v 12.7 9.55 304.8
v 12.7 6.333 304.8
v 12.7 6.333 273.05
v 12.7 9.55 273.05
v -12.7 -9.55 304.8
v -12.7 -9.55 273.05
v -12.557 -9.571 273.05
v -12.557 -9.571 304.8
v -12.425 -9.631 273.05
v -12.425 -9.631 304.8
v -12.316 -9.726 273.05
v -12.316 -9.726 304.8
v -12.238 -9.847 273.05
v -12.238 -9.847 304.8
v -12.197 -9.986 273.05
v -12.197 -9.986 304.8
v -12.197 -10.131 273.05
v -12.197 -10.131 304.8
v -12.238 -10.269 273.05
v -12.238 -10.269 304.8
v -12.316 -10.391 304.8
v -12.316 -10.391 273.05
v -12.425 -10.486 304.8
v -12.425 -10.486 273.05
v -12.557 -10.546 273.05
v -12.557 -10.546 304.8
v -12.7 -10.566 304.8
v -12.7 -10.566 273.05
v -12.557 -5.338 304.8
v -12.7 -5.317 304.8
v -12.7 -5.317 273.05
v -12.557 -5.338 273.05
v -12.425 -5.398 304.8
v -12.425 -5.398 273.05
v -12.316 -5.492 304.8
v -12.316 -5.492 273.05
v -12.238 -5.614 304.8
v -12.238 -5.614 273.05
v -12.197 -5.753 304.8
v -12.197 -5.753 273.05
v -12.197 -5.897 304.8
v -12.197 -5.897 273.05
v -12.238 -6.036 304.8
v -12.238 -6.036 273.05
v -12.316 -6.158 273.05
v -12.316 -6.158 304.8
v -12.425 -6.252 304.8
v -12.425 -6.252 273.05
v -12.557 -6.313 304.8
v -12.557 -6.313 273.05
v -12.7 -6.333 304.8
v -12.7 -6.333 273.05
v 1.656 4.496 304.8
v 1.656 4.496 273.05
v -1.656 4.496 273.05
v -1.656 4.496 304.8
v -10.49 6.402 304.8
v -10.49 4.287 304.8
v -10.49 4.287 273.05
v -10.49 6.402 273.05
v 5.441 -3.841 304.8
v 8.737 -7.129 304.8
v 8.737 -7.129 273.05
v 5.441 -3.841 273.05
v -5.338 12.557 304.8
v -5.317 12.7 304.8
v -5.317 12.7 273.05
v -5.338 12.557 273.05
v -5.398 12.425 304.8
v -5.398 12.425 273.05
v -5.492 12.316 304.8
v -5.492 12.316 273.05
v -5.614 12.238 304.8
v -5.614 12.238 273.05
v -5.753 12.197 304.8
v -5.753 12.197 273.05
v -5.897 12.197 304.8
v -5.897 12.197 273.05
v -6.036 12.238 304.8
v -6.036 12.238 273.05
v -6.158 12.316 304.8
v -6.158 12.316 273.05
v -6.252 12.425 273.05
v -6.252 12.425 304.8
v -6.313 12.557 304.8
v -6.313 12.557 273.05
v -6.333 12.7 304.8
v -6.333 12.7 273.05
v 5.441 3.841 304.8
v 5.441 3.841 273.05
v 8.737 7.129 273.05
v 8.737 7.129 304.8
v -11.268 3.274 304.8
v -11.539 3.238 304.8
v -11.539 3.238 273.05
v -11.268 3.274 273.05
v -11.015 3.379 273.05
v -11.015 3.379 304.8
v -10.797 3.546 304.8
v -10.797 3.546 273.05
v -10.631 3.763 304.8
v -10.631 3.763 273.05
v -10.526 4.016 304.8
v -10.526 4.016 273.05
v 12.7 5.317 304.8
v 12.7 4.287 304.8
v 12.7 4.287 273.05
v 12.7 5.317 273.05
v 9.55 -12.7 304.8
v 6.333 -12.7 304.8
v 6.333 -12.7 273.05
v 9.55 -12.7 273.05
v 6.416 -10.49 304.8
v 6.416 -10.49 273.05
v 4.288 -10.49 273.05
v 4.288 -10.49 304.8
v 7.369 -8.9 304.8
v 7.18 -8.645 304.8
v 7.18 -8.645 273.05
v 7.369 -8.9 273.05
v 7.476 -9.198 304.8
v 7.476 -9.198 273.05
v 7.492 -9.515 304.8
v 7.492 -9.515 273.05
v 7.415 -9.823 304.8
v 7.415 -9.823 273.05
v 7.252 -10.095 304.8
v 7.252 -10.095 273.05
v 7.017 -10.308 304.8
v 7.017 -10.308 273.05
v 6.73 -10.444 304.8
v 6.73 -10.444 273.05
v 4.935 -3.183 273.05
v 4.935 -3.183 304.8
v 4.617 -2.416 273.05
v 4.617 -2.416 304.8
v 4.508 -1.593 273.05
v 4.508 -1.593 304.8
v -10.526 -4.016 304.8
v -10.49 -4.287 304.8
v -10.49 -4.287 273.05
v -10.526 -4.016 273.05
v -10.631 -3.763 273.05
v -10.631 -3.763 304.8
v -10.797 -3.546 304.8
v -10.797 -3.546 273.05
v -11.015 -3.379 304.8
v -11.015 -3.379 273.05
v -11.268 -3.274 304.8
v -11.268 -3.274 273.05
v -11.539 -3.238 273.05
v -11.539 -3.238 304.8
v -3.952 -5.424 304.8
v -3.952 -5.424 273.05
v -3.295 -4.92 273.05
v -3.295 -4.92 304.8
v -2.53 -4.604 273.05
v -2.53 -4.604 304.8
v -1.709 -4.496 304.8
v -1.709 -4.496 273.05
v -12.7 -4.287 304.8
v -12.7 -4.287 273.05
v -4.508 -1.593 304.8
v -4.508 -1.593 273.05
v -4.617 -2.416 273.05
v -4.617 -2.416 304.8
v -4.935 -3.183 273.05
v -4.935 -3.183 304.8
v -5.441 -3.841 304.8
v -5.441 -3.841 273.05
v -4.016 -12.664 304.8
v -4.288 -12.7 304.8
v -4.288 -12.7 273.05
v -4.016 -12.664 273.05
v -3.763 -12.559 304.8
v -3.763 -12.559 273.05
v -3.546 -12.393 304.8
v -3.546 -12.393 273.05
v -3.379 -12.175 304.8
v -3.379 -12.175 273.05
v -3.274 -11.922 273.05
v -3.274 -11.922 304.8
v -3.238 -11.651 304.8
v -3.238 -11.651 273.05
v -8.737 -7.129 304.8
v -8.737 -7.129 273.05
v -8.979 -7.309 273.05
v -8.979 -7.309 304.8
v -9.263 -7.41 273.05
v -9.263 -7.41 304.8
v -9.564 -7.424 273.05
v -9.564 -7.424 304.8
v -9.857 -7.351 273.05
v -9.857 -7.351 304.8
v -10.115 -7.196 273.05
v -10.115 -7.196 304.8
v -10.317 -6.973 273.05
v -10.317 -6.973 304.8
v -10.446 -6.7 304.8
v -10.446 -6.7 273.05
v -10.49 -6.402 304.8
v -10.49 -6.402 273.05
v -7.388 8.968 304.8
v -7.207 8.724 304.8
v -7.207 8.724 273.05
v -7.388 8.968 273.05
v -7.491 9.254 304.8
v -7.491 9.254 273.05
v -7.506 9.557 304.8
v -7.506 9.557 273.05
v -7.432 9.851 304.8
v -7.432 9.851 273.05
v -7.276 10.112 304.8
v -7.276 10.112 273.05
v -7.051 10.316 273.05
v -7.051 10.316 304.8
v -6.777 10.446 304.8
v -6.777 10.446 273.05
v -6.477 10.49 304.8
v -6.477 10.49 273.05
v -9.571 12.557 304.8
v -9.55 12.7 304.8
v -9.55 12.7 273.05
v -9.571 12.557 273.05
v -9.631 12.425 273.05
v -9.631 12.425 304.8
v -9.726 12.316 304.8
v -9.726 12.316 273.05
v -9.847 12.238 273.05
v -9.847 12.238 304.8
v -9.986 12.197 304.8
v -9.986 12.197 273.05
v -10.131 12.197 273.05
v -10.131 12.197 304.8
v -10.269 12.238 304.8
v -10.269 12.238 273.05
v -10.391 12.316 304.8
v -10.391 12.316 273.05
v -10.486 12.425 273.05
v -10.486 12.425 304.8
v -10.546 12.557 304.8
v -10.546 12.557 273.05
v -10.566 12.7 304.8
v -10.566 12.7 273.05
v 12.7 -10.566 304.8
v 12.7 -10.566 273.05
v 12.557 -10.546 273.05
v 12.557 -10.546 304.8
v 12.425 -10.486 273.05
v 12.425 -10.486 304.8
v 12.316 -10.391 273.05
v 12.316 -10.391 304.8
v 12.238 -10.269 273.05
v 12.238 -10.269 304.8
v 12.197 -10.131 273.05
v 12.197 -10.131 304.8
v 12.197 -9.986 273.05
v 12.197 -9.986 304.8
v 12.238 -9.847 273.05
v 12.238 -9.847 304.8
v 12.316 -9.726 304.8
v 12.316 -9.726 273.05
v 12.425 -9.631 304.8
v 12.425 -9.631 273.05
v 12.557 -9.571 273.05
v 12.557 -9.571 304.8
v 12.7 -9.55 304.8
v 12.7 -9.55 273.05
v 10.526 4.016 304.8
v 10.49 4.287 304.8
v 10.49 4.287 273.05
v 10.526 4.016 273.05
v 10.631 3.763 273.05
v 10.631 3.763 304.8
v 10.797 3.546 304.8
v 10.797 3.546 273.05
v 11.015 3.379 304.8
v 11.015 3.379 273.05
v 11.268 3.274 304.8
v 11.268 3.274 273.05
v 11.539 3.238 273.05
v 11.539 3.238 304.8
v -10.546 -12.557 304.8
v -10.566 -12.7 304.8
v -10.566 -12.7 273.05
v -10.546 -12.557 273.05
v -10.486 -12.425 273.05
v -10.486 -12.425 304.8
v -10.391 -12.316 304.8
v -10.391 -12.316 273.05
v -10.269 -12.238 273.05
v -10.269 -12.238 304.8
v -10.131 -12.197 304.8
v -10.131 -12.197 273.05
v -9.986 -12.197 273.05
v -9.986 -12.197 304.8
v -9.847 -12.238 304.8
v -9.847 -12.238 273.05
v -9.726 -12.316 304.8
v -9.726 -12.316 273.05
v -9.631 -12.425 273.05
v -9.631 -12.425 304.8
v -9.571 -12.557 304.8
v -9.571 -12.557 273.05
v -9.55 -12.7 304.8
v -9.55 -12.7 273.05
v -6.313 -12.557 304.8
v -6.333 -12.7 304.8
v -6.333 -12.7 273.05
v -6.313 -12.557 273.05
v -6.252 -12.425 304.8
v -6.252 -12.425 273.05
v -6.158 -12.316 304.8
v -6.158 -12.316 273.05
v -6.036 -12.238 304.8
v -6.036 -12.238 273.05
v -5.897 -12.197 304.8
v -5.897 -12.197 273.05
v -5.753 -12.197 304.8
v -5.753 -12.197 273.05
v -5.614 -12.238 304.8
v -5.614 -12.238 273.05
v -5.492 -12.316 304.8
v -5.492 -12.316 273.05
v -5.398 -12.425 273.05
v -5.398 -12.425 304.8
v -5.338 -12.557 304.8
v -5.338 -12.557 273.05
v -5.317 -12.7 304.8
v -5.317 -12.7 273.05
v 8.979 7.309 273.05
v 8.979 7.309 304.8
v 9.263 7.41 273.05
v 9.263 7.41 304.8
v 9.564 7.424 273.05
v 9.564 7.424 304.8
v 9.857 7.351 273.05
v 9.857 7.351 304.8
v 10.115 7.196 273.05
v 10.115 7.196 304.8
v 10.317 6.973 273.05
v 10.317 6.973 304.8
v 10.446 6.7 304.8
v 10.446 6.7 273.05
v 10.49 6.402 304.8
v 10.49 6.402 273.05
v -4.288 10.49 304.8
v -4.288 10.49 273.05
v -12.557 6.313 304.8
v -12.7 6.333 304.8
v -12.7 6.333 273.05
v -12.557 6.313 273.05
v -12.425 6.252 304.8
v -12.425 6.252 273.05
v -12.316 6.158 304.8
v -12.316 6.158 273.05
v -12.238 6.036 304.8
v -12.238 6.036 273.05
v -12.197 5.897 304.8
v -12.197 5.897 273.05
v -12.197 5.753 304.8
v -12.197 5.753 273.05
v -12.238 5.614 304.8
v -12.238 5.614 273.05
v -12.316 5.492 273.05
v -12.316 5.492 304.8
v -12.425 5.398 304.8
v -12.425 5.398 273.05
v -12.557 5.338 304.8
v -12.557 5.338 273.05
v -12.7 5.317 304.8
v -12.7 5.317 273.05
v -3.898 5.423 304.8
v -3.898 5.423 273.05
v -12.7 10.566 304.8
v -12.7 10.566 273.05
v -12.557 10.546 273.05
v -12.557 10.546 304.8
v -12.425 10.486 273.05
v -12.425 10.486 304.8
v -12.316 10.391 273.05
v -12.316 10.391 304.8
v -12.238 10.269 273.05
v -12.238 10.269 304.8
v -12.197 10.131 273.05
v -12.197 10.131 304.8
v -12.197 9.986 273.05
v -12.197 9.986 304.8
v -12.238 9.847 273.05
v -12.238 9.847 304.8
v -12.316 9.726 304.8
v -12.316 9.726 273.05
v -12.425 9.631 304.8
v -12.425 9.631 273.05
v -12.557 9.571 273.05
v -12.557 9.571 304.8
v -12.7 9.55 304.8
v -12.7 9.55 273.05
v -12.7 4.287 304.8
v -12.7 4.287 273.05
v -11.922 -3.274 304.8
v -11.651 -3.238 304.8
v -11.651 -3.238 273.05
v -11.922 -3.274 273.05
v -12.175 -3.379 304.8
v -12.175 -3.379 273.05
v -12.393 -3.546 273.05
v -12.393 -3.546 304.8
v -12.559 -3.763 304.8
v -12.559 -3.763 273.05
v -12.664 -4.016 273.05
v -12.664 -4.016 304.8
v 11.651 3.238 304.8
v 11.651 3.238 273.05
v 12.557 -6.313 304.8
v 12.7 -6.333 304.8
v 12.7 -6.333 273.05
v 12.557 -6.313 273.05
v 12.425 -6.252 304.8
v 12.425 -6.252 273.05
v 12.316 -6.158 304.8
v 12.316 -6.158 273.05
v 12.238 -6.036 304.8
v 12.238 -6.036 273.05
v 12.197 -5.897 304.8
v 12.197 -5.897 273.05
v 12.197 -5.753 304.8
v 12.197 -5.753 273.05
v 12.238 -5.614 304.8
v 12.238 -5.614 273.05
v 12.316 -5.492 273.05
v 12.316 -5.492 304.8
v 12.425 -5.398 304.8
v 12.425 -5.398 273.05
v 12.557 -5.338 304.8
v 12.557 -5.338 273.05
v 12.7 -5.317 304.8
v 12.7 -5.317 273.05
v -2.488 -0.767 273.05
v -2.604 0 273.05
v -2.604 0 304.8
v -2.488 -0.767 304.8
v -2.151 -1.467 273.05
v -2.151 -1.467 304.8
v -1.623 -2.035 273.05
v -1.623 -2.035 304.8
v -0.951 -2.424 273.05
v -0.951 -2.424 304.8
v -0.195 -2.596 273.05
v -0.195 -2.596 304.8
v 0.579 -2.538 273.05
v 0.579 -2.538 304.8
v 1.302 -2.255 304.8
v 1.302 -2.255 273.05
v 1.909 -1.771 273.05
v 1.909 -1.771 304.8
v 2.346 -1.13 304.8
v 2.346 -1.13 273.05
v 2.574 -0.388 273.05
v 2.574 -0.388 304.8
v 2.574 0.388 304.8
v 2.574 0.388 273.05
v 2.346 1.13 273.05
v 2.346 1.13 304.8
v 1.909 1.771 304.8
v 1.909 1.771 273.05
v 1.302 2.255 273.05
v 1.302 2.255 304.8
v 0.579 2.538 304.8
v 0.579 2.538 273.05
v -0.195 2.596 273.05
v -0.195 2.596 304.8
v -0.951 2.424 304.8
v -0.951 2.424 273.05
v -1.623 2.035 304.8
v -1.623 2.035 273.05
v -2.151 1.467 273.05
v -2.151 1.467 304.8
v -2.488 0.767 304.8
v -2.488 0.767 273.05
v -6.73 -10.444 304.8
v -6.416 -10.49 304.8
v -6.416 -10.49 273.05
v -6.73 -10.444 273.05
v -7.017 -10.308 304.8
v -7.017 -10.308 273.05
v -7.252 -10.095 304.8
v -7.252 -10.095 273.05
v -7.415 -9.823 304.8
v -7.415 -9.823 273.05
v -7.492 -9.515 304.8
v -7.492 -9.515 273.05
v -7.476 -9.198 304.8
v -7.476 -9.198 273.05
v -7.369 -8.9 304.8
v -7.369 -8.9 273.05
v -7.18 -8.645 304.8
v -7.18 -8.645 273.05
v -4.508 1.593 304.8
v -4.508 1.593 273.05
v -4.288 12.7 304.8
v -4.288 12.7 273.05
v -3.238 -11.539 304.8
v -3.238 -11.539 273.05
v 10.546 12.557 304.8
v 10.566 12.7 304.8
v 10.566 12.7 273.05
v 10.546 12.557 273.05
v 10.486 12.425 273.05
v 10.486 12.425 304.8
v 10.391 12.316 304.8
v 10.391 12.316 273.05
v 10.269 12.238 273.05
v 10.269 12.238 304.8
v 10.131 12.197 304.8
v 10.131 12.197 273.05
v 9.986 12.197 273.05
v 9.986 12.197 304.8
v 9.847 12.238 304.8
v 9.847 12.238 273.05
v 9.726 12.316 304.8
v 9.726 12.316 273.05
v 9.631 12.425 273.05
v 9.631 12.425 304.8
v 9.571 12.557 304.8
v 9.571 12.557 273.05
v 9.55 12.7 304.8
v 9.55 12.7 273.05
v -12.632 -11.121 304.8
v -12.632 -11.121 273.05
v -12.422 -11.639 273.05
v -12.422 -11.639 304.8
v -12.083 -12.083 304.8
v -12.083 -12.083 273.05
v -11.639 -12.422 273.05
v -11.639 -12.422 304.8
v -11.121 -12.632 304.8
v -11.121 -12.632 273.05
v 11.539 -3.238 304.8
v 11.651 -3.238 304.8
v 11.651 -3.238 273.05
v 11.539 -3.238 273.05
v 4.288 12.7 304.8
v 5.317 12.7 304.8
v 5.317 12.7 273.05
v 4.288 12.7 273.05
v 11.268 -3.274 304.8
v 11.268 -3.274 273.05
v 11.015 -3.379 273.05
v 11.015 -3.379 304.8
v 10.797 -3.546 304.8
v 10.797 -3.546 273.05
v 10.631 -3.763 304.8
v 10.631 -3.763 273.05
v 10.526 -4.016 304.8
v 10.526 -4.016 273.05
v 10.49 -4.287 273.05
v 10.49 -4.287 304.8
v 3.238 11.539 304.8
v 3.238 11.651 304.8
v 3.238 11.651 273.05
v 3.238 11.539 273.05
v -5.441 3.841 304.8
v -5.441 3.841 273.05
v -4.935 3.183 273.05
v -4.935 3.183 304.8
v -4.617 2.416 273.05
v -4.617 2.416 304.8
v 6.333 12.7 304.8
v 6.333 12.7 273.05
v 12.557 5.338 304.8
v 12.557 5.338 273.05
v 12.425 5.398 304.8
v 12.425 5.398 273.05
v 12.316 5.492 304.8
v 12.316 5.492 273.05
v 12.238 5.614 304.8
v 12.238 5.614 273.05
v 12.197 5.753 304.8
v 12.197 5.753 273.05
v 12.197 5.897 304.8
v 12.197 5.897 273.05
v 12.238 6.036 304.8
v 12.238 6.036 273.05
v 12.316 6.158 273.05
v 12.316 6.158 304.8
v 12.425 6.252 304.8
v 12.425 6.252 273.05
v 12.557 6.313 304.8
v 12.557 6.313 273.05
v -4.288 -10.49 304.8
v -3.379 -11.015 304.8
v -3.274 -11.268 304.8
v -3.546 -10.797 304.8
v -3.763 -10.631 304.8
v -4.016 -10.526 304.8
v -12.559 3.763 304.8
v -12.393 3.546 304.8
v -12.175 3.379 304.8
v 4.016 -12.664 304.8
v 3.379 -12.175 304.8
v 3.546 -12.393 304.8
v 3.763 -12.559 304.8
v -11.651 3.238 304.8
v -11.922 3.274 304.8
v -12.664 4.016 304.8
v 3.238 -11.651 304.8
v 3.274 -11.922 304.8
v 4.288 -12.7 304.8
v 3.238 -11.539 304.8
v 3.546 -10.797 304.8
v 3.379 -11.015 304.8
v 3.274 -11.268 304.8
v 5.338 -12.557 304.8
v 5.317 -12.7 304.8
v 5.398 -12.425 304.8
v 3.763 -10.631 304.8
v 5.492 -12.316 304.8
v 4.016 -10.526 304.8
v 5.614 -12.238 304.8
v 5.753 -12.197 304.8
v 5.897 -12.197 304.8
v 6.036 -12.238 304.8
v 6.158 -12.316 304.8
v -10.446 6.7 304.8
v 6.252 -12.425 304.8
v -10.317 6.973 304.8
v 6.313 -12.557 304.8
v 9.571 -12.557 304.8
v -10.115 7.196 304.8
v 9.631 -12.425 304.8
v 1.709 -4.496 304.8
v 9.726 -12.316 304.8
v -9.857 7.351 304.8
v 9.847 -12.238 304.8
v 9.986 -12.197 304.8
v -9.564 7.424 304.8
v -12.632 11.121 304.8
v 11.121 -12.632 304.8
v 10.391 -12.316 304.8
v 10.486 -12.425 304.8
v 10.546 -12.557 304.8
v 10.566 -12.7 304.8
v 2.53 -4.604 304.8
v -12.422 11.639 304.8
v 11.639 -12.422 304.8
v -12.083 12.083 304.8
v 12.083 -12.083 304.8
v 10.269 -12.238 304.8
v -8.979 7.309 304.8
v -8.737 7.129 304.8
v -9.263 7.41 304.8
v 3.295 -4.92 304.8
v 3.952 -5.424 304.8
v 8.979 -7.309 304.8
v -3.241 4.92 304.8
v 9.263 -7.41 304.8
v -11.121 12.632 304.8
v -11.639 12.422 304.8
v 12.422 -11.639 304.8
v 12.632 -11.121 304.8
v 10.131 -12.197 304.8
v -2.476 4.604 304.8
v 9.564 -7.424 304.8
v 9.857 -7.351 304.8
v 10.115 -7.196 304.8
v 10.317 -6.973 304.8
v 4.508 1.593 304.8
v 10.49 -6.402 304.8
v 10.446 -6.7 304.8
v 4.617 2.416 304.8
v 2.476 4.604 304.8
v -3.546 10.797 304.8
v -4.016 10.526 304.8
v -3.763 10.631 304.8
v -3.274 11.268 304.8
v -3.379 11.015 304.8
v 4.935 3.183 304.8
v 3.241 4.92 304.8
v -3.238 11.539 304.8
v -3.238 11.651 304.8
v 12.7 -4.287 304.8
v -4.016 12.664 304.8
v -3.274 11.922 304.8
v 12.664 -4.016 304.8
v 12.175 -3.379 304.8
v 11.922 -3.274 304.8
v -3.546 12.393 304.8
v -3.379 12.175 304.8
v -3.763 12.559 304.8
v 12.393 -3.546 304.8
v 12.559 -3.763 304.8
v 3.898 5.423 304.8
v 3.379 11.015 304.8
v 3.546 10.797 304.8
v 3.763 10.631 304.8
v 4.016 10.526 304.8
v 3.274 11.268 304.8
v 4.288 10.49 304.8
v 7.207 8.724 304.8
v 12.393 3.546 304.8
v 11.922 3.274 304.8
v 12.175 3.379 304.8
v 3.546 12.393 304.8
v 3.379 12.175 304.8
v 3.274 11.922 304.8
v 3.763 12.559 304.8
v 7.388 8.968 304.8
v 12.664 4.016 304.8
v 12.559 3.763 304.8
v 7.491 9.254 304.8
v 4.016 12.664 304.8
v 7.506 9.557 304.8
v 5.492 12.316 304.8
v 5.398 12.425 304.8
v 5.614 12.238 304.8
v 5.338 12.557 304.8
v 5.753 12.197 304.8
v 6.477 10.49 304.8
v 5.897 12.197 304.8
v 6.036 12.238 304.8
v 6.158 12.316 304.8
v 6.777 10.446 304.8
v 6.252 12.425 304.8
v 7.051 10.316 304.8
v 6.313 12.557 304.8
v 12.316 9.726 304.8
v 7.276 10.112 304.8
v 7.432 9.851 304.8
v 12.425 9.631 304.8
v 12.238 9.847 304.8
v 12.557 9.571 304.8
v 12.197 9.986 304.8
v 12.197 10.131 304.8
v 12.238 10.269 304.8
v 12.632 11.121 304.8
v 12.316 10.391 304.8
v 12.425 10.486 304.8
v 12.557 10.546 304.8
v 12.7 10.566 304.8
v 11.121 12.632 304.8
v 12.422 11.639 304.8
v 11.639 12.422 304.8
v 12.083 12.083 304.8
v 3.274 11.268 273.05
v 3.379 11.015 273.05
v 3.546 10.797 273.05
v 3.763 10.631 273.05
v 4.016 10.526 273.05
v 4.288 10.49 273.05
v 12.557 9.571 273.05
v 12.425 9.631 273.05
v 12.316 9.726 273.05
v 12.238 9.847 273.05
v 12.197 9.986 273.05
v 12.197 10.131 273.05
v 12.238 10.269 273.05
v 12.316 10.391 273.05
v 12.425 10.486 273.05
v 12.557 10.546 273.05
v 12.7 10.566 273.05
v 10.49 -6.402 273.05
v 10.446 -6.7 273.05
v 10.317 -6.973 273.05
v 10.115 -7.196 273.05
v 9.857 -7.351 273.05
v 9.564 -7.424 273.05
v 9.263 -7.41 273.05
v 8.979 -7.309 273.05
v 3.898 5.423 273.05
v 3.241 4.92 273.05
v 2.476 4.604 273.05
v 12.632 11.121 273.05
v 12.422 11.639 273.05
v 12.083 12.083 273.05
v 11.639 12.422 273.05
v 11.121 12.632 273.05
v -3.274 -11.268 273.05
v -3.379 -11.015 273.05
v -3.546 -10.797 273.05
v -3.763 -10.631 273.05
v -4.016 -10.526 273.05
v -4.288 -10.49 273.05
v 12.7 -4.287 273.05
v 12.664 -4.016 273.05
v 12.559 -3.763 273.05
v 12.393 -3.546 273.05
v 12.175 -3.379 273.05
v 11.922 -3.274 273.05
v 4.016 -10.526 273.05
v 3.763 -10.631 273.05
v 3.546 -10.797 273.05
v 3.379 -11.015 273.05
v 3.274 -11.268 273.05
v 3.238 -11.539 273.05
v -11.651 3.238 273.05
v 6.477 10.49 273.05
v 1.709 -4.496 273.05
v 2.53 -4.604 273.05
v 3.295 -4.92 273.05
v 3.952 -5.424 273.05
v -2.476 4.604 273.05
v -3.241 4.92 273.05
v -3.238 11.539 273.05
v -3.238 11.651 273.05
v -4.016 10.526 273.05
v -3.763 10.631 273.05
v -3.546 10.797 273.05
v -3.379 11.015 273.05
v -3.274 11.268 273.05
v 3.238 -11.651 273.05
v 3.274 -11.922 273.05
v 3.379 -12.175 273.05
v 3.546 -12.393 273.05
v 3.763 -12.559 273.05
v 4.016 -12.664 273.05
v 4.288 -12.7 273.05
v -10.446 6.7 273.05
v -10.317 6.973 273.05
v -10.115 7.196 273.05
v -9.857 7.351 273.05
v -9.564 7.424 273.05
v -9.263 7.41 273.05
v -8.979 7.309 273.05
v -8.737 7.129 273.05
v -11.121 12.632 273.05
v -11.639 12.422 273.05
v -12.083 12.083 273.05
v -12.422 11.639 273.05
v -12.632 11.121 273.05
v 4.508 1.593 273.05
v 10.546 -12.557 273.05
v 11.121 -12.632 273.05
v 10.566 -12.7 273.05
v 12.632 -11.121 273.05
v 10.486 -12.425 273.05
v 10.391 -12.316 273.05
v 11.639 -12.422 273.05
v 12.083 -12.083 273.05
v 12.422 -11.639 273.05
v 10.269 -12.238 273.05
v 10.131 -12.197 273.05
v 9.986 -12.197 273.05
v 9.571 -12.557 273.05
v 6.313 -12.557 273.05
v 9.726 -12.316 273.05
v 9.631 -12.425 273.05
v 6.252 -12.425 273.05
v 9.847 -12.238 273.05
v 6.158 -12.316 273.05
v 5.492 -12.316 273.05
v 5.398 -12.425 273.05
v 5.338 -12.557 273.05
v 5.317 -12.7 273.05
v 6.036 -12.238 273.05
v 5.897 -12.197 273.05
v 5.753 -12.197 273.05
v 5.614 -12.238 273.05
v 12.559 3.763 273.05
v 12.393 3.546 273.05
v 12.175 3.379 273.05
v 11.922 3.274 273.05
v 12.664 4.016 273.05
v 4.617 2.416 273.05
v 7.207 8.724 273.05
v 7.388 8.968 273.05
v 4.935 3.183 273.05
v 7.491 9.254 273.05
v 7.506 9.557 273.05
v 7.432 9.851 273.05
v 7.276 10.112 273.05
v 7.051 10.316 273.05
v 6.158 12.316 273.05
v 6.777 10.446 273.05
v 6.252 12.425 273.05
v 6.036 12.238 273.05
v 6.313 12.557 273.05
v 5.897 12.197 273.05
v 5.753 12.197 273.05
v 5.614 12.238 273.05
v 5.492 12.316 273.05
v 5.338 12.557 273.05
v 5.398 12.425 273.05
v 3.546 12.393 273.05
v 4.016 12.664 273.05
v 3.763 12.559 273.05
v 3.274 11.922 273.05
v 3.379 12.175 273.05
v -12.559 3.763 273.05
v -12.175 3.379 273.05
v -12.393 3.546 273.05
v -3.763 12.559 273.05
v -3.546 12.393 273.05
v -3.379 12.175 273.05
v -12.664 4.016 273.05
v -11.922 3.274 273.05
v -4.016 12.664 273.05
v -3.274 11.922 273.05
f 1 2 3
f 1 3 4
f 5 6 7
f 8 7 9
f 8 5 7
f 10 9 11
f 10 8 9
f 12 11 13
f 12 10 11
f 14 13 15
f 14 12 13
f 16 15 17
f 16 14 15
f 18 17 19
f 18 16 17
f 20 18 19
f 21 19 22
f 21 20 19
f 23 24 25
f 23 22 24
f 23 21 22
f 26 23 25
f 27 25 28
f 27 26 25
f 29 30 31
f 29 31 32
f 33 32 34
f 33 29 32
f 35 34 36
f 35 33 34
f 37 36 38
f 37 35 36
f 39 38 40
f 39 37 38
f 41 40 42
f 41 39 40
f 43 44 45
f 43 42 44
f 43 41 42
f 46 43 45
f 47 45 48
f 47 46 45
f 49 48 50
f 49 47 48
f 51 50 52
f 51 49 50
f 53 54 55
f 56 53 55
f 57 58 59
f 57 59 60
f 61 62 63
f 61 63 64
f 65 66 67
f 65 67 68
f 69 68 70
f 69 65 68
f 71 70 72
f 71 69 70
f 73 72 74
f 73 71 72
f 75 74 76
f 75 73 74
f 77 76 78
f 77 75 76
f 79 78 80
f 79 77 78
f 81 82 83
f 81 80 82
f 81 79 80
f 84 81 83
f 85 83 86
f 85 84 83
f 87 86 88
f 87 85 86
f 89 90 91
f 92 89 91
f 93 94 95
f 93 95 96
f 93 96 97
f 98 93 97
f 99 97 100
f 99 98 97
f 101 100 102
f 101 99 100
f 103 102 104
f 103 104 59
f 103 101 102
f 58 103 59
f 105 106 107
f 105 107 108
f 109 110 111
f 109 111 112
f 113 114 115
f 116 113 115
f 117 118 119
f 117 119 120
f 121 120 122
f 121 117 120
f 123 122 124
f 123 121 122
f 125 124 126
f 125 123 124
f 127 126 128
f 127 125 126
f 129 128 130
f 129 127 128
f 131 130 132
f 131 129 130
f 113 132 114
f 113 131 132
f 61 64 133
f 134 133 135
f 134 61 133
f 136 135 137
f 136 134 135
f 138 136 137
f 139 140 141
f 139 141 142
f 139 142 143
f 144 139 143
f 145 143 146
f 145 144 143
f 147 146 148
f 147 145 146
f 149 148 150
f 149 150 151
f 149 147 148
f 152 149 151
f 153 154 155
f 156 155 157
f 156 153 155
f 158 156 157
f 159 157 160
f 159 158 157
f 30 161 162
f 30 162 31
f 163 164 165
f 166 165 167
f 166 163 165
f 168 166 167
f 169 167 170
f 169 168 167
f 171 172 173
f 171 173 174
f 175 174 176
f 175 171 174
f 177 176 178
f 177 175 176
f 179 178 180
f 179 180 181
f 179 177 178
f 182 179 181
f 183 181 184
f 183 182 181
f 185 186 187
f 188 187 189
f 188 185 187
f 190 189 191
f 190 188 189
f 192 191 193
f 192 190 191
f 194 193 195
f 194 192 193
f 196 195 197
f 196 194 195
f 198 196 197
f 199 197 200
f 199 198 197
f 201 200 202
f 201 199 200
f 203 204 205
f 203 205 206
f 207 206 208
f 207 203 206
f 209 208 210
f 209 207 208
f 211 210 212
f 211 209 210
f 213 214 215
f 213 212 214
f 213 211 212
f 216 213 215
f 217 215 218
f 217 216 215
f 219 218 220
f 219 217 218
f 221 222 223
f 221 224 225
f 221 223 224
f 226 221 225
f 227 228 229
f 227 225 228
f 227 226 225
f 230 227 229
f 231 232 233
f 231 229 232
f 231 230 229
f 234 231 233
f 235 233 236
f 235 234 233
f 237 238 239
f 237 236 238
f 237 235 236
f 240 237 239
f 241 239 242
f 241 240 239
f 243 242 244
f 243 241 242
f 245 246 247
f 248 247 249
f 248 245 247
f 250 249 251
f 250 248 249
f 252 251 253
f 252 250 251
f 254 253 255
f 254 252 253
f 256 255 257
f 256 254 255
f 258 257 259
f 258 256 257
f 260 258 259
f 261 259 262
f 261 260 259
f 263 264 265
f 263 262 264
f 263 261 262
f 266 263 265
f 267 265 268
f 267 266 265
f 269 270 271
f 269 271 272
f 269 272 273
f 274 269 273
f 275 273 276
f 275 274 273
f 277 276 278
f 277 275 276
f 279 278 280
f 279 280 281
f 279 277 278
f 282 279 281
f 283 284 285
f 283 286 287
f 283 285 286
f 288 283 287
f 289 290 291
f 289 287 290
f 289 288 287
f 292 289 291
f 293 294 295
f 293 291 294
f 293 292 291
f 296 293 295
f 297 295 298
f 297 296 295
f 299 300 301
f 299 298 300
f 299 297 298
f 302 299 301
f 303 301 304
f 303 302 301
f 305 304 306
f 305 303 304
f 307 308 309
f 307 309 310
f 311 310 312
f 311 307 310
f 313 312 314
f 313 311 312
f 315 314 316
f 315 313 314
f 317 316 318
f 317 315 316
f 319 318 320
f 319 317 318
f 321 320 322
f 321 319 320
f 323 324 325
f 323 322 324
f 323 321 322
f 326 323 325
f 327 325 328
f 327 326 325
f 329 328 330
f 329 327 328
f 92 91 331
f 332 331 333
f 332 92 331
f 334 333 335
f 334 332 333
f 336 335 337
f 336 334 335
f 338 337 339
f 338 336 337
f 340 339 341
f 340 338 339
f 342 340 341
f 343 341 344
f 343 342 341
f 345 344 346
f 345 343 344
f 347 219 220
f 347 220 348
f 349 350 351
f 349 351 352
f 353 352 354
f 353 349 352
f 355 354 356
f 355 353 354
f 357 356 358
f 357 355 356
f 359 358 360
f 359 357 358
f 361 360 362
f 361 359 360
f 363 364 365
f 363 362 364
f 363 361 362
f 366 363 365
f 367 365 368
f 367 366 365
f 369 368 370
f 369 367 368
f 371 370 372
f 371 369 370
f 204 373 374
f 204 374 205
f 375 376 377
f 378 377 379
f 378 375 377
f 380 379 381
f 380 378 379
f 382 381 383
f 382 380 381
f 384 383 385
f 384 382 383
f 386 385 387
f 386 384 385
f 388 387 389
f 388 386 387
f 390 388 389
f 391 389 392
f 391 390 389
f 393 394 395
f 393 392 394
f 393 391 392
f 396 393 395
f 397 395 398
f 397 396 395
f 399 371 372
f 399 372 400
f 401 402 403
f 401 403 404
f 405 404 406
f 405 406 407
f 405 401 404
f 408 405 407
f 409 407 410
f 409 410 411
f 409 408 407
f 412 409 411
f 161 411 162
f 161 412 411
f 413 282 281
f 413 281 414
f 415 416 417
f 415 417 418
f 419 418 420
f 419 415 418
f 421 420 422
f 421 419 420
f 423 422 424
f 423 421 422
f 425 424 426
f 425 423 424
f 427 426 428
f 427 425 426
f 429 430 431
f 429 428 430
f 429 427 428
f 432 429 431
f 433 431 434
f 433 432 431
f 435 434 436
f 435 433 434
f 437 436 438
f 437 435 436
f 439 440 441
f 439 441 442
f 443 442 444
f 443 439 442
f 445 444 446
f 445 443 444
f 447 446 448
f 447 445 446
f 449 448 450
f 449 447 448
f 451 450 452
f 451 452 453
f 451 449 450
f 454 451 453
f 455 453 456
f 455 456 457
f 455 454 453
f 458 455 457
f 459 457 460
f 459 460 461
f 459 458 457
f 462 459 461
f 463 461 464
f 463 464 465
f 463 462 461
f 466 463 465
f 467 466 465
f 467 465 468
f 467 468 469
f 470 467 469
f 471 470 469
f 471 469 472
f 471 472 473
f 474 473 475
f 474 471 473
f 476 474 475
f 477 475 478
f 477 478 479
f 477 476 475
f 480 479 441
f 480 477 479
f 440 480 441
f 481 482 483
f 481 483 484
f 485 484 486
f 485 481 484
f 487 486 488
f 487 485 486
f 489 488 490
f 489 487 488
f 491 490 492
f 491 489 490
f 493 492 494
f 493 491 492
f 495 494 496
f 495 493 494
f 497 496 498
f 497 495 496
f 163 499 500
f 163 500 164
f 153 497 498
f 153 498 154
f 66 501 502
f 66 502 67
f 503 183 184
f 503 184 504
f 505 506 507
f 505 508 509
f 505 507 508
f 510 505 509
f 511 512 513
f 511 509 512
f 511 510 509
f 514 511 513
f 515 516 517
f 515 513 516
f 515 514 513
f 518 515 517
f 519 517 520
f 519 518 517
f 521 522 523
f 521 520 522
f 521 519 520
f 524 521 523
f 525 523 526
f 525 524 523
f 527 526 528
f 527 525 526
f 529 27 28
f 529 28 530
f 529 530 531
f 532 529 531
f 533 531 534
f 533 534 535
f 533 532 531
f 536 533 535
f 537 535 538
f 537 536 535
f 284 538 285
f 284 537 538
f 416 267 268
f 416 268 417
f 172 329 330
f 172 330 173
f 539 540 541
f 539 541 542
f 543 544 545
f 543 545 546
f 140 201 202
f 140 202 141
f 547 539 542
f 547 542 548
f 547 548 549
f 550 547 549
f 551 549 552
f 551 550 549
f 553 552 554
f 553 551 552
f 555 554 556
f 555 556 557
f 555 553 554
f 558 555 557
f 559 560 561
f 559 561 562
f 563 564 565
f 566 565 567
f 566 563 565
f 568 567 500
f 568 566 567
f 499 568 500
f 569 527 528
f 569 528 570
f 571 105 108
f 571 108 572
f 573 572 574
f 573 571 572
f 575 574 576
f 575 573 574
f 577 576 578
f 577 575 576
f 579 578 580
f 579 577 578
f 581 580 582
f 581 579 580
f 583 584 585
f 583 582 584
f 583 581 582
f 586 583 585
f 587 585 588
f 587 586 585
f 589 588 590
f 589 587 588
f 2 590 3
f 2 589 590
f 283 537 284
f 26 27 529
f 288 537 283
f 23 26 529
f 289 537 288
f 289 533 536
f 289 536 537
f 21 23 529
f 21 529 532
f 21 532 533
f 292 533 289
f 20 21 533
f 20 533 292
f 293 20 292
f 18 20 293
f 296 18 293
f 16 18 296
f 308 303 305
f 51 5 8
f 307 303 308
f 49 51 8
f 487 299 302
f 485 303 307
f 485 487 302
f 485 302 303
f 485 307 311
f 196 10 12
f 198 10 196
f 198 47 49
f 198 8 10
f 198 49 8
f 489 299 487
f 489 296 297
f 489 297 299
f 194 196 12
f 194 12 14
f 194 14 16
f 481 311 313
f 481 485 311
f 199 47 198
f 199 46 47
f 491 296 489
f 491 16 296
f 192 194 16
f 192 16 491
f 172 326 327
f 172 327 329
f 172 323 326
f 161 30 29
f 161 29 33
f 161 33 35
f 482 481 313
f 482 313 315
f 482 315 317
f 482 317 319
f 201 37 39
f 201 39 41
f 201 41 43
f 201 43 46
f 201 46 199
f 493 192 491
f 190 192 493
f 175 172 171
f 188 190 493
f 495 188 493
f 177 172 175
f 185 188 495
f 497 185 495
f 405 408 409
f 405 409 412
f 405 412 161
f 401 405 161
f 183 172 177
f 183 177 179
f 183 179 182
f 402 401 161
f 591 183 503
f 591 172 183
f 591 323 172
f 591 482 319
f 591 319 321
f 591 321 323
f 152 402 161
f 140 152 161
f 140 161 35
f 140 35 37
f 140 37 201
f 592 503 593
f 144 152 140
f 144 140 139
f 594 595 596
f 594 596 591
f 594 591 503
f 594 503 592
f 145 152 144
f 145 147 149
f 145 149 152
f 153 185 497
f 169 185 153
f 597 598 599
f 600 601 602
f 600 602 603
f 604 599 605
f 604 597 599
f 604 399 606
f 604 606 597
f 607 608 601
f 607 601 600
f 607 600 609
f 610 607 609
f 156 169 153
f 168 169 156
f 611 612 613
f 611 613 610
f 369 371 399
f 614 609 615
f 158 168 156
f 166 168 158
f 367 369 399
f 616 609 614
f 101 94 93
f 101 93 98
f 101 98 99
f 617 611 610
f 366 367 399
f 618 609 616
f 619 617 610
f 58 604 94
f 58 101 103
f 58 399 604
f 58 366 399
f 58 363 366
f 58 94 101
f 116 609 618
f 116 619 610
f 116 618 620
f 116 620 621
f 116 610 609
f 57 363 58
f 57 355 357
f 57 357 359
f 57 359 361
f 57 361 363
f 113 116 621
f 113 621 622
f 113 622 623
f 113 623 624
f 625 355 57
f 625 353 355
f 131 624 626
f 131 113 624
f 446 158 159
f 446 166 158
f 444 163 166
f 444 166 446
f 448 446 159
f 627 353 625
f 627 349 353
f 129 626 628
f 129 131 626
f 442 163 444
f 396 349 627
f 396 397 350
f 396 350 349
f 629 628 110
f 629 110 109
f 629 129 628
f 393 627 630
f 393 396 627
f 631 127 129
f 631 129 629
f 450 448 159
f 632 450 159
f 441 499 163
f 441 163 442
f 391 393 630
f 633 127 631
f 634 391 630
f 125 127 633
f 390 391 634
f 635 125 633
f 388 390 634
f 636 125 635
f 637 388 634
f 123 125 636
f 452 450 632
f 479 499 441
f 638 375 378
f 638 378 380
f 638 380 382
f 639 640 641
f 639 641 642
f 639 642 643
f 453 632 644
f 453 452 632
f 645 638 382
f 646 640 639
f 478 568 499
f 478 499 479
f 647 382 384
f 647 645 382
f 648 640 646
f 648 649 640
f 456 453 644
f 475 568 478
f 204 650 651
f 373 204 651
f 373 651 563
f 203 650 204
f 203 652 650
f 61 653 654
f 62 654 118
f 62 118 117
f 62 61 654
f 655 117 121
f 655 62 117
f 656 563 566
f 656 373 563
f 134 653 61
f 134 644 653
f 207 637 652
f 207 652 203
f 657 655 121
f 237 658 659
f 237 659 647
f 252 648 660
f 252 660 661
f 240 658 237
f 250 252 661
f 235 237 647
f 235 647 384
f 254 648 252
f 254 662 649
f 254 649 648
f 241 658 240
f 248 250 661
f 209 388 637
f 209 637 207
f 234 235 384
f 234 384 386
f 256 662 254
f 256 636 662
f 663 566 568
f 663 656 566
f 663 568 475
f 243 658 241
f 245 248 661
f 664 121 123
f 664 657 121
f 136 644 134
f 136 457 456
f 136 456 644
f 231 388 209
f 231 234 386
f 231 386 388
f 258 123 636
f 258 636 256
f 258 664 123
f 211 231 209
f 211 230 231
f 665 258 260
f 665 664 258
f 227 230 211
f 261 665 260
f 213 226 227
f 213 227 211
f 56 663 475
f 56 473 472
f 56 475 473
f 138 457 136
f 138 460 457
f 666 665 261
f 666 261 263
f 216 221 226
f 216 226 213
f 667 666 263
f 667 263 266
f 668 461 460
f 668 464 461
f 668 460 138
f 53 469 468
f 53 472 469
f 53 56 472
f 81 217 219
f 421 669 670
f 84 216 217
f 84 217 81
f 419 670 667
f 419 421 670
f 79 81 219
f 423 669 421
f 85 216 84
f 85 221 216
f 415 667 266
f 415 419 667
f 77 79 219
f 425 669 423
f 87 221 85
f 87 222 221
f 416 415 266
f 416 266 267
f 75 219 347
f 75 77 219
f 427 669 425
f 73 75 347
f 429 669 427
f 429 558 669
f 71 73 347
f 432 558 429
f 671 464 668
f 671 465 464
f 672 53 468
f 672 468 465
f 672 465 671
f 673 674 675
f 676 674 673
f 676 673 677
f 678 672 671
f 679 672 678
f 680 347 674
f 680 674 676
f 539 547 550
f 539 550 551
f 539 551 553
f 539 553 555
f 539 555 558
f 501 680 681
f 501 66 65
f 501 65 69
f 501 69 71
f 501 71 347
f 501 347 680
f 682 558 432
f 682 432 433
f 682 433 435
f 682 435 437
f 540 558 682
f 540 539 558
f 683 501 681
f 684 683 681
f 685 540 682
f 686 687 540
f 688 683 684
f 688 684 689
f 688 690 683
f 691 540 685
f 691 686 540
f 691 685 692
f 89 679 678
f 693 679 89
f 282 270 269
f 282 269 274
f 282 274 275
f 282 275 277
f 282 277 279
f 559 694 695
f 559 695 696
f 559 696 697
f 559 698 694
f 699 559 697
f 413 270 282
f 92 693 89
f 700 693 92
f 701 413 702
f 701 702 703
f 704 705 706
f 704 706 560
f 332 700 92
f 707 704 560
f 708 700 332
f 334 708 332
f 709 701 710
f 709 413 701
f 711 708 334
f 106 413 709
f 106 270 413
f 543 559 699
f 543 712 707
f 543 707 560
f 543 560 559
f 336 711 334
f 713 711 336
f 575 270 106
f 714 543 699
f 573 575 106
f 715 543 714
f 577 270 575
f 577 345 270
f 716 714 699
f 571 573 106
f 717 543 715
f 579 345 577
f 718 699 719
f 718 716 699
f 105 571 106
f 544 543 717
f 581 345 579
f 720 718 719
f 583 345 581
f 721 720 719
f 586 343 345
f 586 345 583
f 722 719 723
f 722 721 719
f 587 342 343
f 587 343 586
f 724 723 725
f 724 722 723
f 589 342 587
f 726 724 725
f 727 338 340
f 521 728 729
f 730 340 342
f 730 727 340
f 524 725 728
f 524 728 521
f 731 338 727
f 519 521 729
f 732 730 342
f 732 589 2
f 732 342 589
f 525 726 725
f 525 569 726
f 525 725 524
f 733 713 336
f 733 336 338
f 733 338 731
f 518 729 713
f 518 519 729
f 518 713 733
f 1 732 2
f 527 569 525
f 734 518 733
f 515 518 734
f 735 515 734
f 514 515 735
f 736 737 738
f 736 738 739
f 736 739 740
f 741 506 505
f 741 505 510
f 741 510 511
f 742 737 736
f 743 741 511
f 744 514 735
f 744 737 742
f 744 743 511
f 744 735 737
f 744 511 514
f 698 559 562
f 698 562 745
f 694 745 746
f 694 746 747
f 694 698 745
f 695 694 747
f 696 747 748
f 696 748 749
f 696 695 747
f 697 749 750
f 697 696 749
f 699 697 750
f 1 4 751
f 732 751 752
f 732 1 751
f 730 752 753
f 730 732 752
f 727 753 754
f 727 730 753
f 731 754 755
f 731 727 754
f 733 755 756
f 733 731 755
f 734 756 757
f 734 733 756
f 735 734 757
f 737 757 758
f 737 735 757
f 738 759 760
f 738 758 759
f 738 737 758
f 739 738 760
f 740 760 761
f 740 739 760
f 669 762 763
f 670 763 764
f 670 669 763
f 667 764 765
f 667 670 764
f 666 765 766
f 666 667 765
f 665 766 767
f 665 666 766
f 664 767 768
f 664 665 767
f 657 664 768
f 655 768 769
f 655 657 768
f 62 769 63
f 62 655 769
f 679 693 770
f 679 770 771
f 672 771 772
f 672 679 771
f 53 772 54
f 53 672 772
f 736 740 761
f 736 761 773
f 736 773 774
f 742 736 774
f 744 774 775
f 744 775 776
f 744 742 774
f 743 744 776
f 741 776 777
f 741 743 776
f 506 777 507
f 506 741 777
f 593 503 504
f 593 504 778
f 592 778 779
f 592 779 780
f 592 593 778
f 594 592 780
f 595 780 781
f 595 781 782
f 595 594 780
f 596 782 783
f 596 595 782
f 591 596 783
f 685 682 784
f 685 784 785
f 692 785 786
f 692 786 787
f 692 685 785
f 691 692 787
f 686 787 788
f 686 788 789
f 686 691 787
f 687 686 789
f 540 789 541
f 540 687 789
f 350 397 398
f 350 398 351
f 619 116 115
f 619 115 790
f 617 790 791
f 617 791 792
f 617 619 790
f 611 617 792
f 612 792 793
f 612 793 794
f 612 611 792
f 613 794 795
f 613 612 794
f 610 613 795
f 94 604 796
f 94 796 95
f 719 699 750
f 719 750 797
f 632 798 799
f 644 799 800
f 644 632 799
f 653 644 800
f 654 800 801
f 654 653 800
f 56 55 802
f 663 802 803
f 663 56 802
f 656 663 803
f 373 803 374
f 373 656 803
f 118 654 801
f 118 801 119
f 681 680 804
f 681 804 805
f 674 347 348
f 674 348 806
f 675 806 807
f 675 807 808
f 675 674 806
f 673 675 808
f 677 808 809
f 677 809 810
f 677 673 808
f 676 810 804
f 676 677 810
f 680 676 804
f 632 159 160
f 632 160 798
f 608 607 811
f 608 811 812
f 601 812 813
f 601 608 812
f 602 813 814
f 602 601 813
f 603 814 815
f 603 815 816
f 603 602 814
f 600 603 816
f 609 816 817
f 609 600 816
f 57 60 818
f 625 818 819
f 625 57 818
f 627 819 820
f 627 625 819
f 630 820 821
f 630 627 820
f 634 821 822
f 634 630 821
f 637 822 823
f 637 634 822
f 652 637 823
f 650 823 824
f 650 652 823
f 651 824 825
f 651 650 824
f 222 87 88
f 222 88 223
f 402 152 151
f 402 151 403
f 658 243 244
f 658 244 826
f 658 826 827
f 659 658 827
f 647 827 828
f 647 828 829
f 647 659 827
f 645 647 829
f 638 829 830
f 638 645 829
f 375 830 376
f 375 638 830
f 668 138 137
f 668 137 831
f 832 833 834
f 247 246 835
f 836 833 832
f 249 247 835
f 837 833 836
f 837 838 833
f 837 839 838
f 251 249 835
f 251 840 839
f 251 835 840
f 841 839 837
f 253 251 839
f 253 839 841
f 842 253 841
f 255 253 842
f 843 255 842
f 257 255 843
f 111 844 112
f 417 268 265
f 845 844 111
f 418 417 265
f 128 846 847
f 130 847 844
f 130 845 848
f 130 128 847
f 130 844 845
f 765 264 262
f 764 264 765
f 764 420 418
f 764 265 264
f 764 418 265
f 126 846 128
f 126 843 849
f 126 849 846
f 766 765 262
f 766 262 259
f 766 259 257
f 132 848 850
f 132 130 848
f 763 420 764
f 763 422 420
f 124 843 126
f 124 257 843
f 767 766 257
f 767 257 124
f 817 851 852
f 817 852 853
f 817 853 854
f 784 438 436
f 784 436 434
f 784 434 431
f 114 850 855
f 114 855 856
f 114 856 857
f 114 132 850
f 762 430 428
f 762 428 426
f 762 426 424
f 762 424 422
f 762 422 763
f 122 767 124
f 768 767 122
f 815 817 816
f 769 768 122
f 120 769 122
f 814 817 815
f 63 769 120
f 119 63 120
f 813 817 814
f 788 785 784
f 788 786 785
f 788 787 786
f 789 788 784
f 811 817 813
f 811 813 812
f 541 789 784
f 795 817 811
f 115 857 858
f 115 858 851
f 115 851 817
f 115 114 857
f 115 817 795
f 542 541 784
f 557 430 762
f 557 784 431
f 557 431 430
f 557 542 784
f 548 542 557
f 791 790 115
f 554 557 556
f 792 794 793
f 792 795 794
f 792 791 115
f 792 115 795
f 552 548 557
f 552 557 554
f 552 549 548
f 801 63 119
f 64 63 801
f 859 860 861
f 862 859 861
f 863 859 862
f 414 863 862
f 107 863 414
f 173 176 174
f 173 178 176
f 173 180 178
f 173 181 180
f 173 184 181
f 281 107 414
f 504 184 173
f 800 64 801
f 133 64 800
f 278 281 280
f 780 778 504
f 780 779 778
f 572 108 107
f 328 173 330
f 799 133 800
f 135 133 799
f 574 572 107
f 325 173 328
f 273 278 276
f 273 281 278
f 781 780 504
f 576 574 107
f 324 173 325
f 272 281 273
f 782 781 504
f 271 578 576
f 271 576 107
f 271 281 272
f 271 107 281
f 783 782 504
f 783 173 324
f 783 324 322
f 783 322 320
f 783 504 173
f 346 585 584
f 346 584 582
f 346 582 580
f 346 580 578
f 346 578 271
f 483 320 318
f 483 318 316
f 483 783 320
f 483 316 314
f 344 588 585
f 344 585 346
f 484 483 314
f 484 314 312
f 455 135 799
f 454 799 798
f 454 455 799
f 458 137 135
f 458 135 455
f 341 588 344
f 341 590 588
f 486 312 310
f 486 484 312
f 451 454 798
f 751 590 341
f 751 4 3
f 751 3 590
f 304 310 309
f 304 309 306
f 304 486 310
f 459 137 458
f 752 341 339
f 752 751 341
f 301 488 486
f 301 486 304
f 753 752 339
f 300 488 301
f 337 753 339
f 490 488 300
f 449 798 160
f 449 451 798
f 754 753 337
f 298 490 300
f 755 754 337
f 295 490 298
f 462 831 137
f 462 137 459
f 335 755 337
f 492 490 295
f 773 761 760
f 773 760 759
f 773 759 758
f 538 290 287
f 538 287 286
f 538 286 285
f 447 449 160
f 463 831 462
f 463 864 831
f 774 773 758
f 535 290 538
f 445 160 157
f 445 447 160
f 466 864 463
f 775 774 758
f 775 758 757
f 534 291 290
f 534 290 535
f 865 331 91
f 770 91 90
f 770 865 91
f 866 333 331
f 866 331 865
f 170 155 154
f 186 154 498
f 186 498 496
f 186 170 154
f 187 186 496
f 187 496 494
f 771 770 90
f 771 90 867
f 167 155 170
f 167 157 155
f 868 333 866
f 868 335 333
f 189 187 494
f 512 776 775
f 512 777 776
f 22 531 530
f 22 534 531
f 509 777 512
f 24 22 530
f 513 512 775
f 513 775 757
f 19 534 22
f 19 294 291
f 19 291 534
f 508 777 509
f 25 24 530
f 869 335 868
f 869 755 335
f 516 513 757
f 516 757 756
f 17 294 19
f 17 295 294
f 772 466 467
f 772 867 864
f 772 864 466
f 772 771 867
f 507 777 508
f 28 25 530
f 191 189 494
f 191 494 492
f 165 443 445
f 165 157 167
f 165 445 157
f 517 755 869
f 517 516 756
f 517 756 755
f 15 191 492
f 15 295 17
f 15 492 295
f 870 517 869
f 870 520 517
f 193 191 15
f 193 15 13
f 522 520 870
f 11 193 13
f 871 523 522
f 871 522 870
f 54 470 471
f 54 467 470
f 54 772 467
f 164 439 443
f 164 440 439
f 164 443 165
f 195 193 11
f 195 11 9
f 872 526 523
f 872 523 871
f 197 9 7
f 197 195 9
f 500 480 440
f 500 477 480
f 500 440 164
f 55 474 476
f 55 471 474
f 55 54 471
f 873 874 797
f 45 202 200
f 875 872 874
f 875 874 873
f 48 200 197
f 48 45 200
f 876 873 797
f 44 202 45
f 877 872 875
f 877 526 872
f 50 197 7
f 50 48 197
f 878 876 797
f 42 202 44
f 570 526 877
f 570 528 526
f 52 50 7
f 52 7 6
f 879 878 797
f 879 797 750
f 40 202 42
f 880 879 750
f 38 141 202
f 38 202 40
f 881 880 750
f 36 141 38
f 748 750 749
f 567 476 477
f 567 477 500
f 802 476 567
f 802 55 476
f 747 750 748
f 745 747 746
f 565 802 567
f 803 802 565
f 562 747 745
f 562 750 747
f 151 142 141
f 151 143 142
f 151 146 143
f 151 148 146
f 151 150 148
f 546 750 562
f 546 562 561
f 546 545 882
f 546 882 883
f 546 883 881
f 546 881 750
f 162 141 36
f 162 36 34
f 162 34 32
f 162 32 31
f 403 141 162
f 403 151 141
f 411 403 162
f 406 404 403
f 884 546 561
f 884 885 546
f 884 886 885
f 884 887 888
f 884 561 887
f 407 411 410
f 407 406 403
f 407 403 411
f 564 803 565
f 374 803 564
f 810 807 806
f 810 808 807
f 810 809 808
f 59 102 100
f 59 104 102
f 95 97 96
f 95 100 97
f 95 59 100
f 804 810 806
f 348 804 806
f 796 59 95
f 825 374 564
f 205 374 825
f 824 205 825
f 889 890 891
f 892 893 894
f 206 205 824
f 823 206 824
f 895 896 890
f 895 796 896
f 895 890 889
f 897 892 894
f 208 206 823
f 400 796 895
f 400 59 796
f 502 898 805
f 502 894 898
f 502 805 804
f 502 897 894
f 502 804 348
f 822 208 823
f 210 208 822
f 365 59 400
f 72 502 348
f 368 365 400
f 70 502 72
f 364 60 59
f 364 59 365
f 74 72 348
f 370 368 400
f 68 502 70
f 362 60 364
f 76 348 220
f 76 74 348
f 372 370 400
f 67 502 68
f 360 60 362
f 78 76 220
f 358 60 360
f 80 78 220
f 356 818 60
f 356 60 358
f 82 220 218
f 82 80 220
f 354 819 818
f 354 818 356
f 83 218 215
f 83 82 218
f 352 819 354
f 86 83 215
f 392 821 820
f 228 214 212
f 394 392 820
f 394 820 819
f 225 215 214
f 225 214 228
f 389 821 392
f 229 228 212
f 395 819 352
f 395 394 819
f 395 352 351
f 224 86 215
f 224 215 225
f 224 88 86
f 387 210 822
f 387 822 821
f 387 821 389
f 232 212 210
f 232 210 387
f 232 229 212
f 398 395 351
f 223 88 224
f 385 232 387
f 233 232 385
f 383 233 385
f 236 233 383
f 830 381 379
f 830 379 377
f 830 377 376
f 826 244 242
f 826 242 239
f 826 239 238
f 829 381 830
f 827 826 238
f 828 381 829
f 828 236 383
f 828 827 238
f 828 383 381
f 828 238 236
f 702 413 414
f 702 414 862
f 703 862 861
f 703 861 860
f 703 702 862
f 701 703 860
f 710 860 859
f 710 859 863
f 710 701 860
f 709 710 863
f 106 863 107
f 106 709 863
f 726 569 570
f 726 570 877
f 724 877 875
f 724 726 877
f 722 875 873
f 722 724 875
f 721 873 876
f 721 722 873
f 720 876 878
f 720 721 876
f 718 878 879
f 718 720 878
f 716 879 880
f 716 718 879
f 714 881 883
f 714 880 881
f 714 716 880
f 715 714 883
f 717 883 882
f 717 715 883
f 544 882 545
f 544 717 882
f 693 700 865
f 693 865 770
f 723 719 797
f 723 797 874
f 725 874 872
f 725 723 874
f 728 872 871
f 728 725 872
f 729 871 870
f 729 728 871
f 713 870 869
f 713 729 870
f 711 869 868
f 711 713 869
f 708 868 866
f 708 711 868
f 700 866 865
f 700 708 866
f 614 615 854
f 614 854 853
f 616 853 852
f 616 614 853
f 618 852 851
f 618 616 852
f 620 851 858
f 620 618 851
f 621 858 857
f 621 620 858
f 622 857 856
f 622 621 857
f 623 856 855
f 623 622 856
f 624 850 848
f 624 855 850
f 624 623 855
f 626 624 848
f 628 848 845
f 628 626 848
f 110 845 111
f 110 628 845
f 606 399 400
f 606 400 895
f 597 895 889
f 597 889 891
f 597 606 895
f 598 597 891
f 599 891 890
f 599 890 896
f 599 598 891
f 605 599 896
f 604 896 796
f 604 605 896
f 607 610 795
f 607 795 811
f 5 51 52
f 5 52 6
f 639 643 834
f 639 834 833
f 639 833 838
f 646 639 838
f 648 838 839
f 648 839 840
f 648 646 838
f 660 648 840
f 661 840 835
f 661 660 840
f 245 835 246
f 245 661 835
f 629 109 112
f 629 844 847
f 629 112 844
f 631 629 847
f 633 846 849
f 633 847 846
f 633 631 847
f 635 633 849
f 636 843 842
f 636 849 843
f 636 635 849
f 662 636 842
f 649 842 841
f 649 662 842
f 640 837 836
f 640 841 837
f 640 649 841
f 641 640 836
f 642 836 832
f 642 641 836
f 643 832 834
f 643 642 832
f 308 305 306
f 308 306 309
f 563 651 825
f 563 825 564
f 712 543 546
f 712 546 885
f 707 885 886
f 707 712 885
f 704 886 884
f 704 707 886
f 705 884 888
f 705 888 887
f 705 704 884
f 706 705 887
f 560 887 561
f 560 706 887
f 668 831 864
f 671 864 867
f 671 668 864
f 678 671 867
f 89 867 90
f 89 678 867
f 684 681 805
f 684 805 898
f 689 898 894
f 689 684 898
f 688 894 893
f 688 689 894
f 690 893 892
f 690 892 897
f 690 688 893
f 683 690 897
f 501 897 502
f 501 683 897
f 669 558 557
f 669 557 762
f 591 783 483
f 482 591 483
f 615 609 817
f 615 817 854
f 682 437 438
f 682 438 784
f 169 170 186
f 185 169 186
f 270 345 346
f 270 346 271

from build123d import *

# Parameters (mm, degrees)
SKETCH1_R           = 2.6035
BOSS_EXTRUDE1_DEPTH = 304.8
SKETCH2_R           = 24.282664684
CUT_EXTRUDE1_DEPTH  = 577.85


with BuildPart() as part:
    # Sketch1 → Boss-Extrude1 (new, symmetric)
    with BuildSketch(Plane.XY):
        with BuildLine():
            Line((-7.179650497, -8.645192506), (-3.952270251, -5.423690499))
            ThreePointArc((-3.952270251, -5.423690499), (-2.922936451, -4.736929036), (-1.709253557, -4.4958))
            Line((-1.709253557, -4.4958), (1.709253557, -4.4958))
            ThreePointArc((1.709253557, -4.4958), (2.922936451, -4.736929036), (3.952270251, -5.423690499))
            Line((3.952270251, -5.423690499), (7.179650497, -8.645192506))
            ThreePointArc((7.179650497, -8.645192506), (7.41473083, -9.822813117), (6.416408329, -10.4902))
            Line((6.416408329, -10.4902), (4.287512407, -10.4902))
            ThreePointArc((4.287512407, -10.4902), (3.54574862, -10.79744862), (3.2385, -11.539212407))
            Line((3.2385, -11.539212407), (3.2385, -11.650987593))
            ThreePointArc((3.2385, -11.650987593), (3.54574862, -12.39275138), (4.287512407, -12.7))
            Line((4.287512407, -12.7), (5.317126718, -12.7))
            ThreePointArc((5.317126718, -12.7), (5.825126718, -12.192), (6.333126718, -12.7))
            Line((6.333126718, -12.7), (9.550443118, -12.7))
            ThreePointArc((9.550443118, -12.7), (10.058366869, -12.192000006), (10.566443095, -12.699847501))
            ThreePointArc((10.566443095, -12.699847501), (12.082537762, -12.08250727), (12.699846982, -10.566399977))
            ThreePointArc((12.699846982, -10.566399977), (12.192000006, -10.058323491), (12.7, -9.5504))
            Line((12.7, -9.5504), (12.7, -6.3330836))
            ThreePointArc((12.7, -6.3330836), (12.192, -5.8250836), (12.7, -5.3170836))
            Line((12.7, -5.3170836), (12.7, -4.287469289))
            ThreePointArc((12.7, -4.287469289), (12.39275138, -3.545705502), (11.650987593, -3.238456882))
            Line((11.650987593, -3.238456882), (11.539212407, -3.238456882))
            ThreePointArc((11.539212407, -3.238456882), (10.79744862, -3.545705502), (10.4902, -4.287469289))
            Line((10.4902, -4.287469289), (10.4902, -6.402089023))
            ThreePointArc((10.4902, -6.402089023), (9.856505071, -7.351067942), (8.737131347, -7.129408934))
            Line((8.737131347, -7.129408934), (5.441005833, -3.840816462))
            ThreePointArc((5.441005833, -3.840816462), (4.750877967, -2.809883091), (4.5085, -1.593185507))
            Line((4.5085, -1.593185507), (4.5085, 1.593185507))
            ThreePointArc((4.5085, 1.593185507), (4.750877967, 2.809883091), (5.441005833, 3.840816462))
            Line((5.441005833, 3.840816462), (8.737131347, 7.129408934))
            ThreePointArc((8.737131347, 7.129408934), (9.856505071, 7.351067942), (10.4902, 6.402089023))
            Line((10.4902, 6.402089023), (10.4902, 4.287469289))
            ThreePointArc((10.4902, 4.287469289), (10.79744862, 3.545705502), (11.539212407, 3.238456882))
            Line((11.539212407, 3.238456882), (11.650987593, 3.238456882))
            ThreePointArc((11.650987593, 3.238456882), (12.39275138, 3.545705502), (12.7, 4.287469289))
            Line((12.7, 4.287469289), (12.7, 5.3170836))
            ThreePointArc((12.7, 5.3170836), (12.192, 5.8250836), (12.7, 6.3330836))
            Line((12.7, 6.3330836), (12.7, 9.5504))
            ThreePointArc((12.7, 9.5504), (12.192000006, 10.058323491), (12.699846982, 10.566399977))
            ThreePointArc((12.699846982, 10.566399977), (12.082537762, 12.08250727), (10.566443095, 12.699847501))
            ThreePointArc((10.566443095, 12.699847501), (10.058366869, 12.192000006), (9.550443118, 12.7))
            Line((9.550443118, 12.7), (6.333126718, 12.7))
            ThreePointArc((6.333126718, 12.7), (5.825126718, 12.192), (5.317126718, 12.7))
            Line((5.317126718, 12.7), (4.287512407, 12.7))
            ThreePointArc((4.287512407, 12.7), (3.54574862, 12.39275138), (3.2385, 11.650987593))
            Line((3.2385, 11.650987593), (3.2385, 11.539212407))
            ThreePointArc((3.2385, 11.539212407), (3.54574862, 10.79744862), (4.287512407, 10.4902))
            Line((4.287512407, 10.4902), (6.476788598, 10.4902))
            ThreePointArc((6.476788598, 10.4902), (7.432222385, 9.85140422), (7.207036008, 8.724370562))
            Line((7.207036008, 8.724370562), (3.898272566, 5.423169045))
            ThreePointArc((3.898272566, 5.423169045), (2.869120213, 4.736787962), (1.655778399, 4.4958))
            Line((1.655778399, 4.4958), (-1.655778399, 4.4958))
            ThreePointArc((-1.655778399, 4.4958), (-2.869120213, 4.736787962), (-3.898272566, 5.423169045))
            Line((-3.898272566, 5.423169045), (-7.207036008, 8.724370562))
            ThreePointArc((-7.207036008, 8.724370562), (-7.432222385, 9.85140422), (-6.476788598, 10.4902))
            Line((-6.476788598, 10.4902), (-4.287512407, 10.4902))
            ThreePointArc((-4.287512407, 10.4902), (-3.54574862, 10.79744862), (-3.2385, 11.539212407))
            Line((-3.2385, 11.539212407), (-3.2385, 11.650987593))
            ThreePointArc((-3.2385, 11.650987593), (-3.54574862, 12.39275138), (-4.287512407, 12.7))
            Line((-4.287512407, 12.7), (-5.317126718, 12.7))
            ThreePointArc((-5.317126718, 12.7), (-5.825126718, 12.192), (-6.333126718, 12.7))
            Line((-6.333126718, 12.7), (-9.550443118, 12.7))
            ThreePointArc((-9.550443118, 12.7), (-10.058366869, 12.192000006), (-10.566443095, 12.699847501))
            ThreePointArc((-10.566443095, 12.699847501), (-12.082537762, 12.08250727), (-12.699846982, 10.566399977))
            ThreePointArc((-12.699846982, 10.566399977), (-12.192000006, 10.058323491), (-12.7, 9.5504))
            Line((-12.7, 9.5504), (-12.7, 6.3330836))
            ThreePointArc((-12.7, 6.3330836), (-12.192, 5.8250836), (-12.7, 5.3170836))
            Line((-12.7, 5.3170836), (-12.7, 4.287469289))
            ThreePointArc((-12.7, 4.287469289), (-12.39275138, 3.545705502), (-11.650987593, 3.238456882))
            Line((-11.650987593, 3.238456882), (-11.539212407, 3.238456882))
            ThreePointArc((-11.539212407, 3.238456882), (-10.79744862, 3.545705502), (-10.4902, 4.287469289))
            Line((-10.4902, 4.287469289), (-10.4902, 6.402089023))
            ThreePointArc((-10.4902, 6.402089023), (-9.856505071, 7.351067942), (-8.737131347, 7.129408934))
            Line((-8.737131347, 7.129408934), (-5.441005833, 3.840816462))
            ThreePointArc((-5.441005833, 3.840816462), (-4.750877967, 2.809883091), (-4.5085, 1.593185507))
            Line((-4.5085, 1.593185507), (-4.5085, -1.593185507))
            ThreePointArc((-4.5085, -1.593185507), (-4.750877967, -2.809883091), (-5.441005833, -3.840816462))
            Line((-5.441005833, -3.840816462), (-8.737131347, -7.129408934))
            ThreePointArc((-8.737131347, -7.129408934), (-9.856505071, -7.351067942), (-10.4902, -6.402089023))
            Line((-10.4902, -6.402089023), (-10.4902, -4.287469289))
            ThreePointArc((-10.4902, -4.287469289), (-10.79744862, -3.545705502), (-11.539212407, -3.238456882))
            Line((-11.539212407, -3.238456882), (-11.650987593, -3.238456882))
            ThreePointArc((-11.650987593, -3.238456882), (-12.39275138, -3.545705502), (-12.7, -4.287469289))
            Line((-12.7, -4.287469289), (-12.7, -5.3170836))
            ThreePointArc((-12.7, -5.3170836), (-12.192, -5.8250836), (-12.7, -6.3330836))
            Line((-12.7, -6.3330836), (-12.7, -9.5504))
            ThreePointArc((-12.7, -9.5504), (-12.192000006, -10.058323491), (-12.699846982, -10.566399977))
            ThreePointArc((-12.699846982, -10.566399977), (-12.082537762, -12.08250727), (-10.566443095, -12.699847501))
            ThreePointArc((-10.566443095, -12.699847501), (-10.058366869, -12.192000006), (-9.550443118, -12.7))
            Line((-9.550443118, -12.7), (-6.333126718, -12.7))
            ThreePointArc((-6.333126718, -12.7), (-5.825126718, -12.192), (-5.317126718, -12.7))
            Line((-5.317126718, -12.7), (-4.287512407, -12.7))
            ThreePointArc((-4.287512407, -12.7), (-3.54574862, -12.39275138), (-3.2385, -11.650987593))
            Line((-3.2385, -11.650987593), (-3.2385, -11.539212407))
            ThreePointArc((-3.2385, -11.539212407), (-3.54574862, -10.79744862), (-4.287512407, -10.4902))
            Line((-4.287512407, -10.4902), (-6.416408329, -10.4902))
            ThreePointArc((-6.416408329, -10.4902), (-7.41473083, -9.822813117), (-7.179650497, -8.645192506))
        make_face()
        with Locations(Location((0, 0, 0), (0, 0, 180))):
            Circle(SKETCH1_R, mode=Mode.SUBTRACT)
    extrude(amount=BOSS_EXTRUDE1_DEPTH, both=True)

    # Sketch2 → Cut-Extrude1 (cut)
    with BuildSketch(Plane(origin=(0, 0, -304.8), x_dir=(-1, 0, 0), z_dir=(0, 0, -1))):
        Circle(SKETCH2_R)
    extrude(amount=-CUT_EXTRUDE1_DEPTH, mode=Mode.SUBTRACT)


solid = part.part
